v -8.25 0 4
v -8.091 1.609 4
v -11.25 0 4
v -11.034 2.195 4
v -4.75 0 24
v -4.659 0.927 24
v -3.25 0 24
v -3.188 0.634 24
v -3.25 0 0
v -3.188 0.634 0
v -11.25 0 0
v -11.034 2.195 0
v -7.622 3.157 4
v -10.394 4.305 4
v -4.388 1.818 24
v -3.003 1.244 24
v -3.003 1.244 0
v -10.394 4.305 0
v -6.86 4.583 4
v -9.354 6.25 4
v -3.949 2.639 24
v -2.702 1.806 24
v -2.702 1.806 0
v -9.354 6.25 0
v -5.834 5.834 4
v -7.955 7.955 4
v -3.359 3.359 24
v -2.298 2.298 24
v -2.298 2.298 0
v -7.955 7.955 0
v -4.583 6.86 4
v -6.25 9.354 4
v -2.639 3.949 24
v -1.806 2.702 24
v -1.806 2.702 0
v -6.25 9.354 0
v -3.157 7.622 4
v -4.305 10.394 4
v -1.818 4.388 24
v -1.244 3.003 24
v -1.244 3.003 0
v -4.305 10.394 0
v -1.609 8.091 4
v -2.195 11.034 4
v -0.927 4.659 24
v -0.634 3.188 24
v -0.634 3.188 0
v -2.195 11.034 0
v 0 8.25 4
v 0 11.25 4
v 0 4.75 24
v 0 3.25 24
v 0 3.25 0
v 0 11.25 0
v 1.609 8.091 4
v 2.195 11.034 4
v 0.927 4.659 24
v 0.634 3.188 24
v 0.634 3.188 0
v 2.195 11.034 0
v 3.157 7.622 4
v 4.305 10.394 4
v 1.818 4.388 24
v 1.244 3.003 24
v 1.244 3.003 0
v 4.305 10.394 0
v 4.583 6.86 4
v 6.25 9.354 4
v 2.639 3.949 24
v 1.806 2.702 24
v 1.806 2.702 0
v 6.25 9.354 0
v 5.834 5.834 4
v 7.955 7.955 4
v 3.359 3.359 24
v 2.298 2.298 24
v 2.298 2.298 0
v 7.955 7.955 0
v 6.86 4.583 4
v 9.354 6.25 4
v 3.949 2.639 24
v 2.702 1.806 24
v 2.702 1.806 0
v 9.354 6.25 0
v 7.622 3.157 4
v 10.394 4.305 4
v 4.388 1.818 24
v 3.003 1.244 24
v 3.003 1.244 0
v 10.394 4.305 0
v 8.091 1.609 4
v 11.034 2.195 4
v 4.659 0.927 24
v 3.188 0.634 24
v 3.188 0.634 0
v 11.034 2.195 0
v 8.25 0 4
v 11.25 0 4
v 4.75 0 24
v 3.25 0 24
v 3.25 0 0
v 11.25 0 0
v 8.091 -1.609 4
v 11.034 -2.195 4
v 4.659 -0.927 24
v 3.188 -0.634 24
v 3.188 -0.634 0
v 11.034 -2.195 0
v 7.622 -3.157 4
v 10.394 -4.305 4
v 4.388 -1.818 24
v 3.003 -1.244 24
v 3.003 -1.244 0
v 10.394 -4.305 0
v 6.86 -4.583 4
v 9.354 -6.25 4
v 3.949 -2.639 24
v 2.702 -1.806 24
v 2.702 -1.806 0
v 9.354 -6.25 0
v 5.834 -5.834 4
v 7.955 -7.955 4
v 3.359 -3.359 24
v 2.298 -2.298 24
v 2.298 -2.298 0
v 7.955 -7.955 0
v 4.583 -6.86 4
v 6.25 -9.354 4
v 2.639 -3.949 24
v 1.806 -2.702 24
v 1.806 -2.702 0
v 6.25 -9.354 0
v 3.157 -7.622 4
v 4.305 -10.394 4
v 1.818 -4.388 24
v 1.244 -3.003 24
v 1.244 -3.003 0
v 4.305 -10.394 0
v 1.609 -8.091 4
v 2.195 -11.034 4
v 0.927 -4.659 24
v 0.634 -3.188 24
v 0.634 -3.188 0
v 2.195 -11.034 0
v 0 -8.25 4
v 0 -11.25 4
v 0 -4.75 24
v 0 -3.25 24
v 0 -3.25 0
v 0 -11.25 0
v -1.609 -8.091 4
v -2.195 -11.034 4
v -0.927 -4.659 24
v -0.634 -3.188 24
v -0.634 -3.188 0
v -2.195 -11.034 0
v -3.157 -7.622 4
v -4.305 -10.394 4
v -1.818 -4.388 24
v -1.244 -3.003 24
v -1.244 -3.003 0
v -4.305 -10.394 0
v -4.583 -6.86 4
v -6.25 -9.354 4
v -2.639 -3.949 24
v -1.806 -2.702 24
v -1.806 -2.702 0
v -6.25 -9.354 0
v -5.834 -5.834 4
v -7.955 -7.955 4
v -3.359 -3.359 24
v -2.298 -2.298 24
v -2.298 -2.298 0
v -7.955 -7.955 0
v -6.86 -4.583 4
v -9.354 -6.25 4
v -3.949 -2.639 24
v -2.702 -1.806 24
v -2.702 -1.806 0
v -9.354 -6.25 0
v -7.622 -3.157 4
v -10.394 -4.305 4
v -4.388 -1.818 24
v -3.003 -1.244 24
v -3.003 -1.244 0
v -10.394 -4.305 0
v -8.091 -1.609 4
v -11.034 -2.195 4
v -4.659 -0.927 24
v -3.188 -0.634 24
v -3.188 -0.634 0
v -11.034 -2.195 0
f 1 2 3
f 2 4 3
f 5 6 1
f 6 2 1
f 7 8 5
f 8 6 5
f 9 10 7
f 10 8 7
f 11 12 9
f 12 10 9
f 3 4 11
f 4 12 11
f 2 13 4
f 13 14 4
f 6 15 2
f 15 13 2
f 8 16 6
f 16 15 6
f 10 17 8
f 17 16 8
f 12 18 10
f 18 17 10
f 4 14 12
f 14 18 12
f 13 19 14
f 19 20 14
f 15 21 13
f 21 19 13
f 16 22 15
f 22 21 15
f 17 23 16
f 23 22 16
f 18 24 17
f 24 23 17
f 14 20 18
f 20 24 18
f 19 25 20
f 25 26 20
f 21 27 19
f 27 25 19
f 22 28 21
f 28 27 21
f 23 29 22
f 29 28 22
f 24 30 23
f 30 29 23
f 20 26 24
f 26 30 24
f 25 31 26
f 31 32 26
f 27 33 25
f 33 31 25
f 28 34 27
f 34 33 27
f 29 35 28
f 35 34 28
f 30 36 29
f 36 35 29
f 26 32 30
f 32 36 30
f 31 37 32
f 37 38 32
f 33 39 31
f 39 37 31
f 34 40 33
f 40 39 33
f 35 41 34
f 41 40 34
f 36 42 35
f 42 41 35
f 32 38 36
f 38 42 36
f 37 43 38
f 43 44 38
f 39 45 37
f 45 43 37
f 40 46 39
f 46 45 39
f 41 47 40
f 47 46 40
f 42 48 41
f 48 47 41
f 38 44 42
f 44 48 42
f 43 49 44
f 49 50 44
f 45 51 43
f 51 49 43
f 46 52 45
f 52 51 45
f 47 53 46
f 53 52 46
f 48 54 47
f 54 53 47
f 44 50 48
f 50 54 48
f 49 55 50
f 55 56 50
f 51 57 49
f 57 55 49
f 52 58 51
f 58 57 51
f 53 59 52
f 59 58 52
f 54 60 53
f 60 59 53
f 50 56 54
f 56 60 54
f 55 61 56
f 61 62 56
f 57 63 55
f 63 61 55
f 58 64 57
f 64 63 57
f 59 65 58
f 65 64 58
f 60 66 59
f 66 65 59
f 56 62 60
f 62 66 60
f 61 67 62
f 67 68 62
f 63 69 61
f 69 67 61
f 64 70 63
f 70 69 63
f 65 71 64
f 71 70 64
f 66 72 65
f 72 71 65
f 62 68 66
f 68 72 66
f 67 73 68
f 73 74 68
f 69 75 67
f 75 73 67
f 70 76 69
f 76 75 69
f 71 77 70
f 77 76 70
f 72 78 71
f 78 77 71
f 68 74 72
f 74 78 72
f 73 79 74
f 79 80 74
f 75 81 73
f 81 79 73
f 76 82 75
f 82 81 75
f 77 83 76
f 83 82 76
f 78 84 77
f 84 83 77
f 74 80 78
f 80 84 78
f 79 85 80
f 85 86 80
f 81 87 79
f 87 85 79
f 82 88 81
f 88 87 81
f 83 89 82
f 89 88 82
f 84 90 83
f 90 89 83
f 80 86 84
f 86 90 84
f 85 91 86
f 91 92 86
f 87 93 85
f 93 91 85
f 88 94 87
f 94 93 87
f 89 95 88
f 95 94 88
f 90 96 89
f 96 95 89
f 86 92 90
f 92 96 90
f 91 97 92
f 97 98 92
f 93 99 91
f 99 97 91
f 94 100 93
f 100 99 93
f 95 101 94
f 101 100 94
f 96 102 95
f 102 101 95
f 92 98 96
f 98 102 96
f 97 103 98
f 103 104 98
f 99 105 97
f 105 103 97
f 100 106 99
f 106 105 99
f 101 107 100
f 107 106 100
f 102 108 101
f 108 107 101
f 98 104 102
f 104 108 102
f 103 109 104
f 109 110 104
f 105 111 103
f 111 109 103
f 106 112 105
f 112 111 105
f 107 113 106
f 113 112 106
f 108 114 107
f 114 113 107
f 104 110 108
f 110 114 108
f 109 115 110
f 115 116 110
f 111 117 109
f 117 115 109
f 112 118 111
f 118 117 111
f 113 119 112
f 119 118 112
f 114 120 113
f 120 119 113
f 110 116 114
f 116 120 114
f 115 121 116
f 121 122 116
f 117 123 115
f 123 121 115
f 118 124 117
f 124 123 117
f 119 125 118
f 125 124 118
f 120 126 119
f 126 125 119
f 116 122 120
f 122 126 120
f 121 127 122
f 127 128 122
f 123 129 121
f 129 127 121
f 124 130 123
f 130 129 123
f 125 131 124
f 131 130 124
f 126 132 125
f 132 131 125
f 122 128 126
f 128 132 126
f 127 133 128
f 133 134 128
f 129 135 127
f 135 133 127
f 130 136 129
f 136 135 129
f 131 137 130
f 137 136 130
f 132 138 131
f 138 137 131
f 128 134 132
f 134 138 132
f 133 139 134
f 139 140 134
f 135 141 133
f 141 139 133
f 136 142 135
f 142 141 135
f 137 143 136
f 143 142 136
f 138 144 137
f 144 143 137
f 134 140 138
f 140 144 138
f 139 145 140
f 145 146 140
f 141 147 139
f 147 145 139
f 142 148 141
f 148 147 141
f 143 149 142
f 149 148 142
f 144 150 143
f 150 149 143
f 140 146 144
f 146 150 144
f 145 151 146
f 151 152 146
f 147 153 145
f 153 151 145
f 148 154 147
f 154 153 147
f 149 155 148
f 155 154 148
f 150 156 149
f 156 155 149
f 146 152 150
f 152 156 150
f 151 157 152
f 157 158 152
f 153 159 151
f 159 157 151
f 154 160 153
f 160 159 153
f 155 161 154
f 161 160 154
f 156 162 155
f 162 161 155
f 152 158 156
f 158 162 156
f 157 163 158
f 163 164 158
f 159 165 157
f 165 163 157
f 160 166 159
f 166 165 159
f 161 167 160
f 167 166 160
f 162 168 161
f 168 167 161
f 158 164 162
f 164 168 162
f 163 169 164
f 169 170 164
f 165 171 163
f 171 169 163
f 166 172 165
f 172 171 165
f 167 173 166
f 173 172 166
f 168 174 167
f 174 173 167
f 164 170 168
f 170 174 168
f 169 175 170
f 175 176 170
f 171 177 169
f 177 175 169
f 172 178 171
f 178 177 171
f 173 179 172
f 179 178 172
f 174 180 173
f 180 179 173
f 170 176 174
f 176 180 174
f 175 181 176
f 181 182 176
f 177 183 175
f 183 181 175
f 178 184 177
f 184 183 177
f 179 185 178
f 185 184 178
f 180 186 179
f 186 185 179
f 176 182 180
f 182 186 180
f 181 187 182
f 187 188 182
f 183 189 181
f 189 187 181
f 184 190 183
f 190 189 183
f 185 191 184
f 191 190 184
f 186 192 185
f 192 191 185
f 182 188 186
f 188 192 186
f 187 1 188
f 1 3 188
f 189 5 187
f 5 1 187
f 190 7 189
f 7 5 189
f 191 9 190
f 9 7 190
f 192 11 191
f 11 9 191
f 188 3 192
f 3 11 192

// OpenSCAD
$fn = 32;

// ----------------------------------------------------------------------
// Profiled standoff: conical spacer, 24 mm long, bore 6.5 mm
// ----------------------------------------------------------------------

// --- parameters (mm) ---
revolve_angle = 360;      // full turn around the Z axis
profile_points = 6;       // points of the closed outline

profile = [[3.25, 0], [11.25, 0], [11.25, 4], [8.25, 4], [4.75, 24], [3.25, 24]];  // single closed polygon, 6 points, counter clockwise

// --- the one profile operation ---
rotate_extrude(angle = revolve_angle) polygon(points = profile);
